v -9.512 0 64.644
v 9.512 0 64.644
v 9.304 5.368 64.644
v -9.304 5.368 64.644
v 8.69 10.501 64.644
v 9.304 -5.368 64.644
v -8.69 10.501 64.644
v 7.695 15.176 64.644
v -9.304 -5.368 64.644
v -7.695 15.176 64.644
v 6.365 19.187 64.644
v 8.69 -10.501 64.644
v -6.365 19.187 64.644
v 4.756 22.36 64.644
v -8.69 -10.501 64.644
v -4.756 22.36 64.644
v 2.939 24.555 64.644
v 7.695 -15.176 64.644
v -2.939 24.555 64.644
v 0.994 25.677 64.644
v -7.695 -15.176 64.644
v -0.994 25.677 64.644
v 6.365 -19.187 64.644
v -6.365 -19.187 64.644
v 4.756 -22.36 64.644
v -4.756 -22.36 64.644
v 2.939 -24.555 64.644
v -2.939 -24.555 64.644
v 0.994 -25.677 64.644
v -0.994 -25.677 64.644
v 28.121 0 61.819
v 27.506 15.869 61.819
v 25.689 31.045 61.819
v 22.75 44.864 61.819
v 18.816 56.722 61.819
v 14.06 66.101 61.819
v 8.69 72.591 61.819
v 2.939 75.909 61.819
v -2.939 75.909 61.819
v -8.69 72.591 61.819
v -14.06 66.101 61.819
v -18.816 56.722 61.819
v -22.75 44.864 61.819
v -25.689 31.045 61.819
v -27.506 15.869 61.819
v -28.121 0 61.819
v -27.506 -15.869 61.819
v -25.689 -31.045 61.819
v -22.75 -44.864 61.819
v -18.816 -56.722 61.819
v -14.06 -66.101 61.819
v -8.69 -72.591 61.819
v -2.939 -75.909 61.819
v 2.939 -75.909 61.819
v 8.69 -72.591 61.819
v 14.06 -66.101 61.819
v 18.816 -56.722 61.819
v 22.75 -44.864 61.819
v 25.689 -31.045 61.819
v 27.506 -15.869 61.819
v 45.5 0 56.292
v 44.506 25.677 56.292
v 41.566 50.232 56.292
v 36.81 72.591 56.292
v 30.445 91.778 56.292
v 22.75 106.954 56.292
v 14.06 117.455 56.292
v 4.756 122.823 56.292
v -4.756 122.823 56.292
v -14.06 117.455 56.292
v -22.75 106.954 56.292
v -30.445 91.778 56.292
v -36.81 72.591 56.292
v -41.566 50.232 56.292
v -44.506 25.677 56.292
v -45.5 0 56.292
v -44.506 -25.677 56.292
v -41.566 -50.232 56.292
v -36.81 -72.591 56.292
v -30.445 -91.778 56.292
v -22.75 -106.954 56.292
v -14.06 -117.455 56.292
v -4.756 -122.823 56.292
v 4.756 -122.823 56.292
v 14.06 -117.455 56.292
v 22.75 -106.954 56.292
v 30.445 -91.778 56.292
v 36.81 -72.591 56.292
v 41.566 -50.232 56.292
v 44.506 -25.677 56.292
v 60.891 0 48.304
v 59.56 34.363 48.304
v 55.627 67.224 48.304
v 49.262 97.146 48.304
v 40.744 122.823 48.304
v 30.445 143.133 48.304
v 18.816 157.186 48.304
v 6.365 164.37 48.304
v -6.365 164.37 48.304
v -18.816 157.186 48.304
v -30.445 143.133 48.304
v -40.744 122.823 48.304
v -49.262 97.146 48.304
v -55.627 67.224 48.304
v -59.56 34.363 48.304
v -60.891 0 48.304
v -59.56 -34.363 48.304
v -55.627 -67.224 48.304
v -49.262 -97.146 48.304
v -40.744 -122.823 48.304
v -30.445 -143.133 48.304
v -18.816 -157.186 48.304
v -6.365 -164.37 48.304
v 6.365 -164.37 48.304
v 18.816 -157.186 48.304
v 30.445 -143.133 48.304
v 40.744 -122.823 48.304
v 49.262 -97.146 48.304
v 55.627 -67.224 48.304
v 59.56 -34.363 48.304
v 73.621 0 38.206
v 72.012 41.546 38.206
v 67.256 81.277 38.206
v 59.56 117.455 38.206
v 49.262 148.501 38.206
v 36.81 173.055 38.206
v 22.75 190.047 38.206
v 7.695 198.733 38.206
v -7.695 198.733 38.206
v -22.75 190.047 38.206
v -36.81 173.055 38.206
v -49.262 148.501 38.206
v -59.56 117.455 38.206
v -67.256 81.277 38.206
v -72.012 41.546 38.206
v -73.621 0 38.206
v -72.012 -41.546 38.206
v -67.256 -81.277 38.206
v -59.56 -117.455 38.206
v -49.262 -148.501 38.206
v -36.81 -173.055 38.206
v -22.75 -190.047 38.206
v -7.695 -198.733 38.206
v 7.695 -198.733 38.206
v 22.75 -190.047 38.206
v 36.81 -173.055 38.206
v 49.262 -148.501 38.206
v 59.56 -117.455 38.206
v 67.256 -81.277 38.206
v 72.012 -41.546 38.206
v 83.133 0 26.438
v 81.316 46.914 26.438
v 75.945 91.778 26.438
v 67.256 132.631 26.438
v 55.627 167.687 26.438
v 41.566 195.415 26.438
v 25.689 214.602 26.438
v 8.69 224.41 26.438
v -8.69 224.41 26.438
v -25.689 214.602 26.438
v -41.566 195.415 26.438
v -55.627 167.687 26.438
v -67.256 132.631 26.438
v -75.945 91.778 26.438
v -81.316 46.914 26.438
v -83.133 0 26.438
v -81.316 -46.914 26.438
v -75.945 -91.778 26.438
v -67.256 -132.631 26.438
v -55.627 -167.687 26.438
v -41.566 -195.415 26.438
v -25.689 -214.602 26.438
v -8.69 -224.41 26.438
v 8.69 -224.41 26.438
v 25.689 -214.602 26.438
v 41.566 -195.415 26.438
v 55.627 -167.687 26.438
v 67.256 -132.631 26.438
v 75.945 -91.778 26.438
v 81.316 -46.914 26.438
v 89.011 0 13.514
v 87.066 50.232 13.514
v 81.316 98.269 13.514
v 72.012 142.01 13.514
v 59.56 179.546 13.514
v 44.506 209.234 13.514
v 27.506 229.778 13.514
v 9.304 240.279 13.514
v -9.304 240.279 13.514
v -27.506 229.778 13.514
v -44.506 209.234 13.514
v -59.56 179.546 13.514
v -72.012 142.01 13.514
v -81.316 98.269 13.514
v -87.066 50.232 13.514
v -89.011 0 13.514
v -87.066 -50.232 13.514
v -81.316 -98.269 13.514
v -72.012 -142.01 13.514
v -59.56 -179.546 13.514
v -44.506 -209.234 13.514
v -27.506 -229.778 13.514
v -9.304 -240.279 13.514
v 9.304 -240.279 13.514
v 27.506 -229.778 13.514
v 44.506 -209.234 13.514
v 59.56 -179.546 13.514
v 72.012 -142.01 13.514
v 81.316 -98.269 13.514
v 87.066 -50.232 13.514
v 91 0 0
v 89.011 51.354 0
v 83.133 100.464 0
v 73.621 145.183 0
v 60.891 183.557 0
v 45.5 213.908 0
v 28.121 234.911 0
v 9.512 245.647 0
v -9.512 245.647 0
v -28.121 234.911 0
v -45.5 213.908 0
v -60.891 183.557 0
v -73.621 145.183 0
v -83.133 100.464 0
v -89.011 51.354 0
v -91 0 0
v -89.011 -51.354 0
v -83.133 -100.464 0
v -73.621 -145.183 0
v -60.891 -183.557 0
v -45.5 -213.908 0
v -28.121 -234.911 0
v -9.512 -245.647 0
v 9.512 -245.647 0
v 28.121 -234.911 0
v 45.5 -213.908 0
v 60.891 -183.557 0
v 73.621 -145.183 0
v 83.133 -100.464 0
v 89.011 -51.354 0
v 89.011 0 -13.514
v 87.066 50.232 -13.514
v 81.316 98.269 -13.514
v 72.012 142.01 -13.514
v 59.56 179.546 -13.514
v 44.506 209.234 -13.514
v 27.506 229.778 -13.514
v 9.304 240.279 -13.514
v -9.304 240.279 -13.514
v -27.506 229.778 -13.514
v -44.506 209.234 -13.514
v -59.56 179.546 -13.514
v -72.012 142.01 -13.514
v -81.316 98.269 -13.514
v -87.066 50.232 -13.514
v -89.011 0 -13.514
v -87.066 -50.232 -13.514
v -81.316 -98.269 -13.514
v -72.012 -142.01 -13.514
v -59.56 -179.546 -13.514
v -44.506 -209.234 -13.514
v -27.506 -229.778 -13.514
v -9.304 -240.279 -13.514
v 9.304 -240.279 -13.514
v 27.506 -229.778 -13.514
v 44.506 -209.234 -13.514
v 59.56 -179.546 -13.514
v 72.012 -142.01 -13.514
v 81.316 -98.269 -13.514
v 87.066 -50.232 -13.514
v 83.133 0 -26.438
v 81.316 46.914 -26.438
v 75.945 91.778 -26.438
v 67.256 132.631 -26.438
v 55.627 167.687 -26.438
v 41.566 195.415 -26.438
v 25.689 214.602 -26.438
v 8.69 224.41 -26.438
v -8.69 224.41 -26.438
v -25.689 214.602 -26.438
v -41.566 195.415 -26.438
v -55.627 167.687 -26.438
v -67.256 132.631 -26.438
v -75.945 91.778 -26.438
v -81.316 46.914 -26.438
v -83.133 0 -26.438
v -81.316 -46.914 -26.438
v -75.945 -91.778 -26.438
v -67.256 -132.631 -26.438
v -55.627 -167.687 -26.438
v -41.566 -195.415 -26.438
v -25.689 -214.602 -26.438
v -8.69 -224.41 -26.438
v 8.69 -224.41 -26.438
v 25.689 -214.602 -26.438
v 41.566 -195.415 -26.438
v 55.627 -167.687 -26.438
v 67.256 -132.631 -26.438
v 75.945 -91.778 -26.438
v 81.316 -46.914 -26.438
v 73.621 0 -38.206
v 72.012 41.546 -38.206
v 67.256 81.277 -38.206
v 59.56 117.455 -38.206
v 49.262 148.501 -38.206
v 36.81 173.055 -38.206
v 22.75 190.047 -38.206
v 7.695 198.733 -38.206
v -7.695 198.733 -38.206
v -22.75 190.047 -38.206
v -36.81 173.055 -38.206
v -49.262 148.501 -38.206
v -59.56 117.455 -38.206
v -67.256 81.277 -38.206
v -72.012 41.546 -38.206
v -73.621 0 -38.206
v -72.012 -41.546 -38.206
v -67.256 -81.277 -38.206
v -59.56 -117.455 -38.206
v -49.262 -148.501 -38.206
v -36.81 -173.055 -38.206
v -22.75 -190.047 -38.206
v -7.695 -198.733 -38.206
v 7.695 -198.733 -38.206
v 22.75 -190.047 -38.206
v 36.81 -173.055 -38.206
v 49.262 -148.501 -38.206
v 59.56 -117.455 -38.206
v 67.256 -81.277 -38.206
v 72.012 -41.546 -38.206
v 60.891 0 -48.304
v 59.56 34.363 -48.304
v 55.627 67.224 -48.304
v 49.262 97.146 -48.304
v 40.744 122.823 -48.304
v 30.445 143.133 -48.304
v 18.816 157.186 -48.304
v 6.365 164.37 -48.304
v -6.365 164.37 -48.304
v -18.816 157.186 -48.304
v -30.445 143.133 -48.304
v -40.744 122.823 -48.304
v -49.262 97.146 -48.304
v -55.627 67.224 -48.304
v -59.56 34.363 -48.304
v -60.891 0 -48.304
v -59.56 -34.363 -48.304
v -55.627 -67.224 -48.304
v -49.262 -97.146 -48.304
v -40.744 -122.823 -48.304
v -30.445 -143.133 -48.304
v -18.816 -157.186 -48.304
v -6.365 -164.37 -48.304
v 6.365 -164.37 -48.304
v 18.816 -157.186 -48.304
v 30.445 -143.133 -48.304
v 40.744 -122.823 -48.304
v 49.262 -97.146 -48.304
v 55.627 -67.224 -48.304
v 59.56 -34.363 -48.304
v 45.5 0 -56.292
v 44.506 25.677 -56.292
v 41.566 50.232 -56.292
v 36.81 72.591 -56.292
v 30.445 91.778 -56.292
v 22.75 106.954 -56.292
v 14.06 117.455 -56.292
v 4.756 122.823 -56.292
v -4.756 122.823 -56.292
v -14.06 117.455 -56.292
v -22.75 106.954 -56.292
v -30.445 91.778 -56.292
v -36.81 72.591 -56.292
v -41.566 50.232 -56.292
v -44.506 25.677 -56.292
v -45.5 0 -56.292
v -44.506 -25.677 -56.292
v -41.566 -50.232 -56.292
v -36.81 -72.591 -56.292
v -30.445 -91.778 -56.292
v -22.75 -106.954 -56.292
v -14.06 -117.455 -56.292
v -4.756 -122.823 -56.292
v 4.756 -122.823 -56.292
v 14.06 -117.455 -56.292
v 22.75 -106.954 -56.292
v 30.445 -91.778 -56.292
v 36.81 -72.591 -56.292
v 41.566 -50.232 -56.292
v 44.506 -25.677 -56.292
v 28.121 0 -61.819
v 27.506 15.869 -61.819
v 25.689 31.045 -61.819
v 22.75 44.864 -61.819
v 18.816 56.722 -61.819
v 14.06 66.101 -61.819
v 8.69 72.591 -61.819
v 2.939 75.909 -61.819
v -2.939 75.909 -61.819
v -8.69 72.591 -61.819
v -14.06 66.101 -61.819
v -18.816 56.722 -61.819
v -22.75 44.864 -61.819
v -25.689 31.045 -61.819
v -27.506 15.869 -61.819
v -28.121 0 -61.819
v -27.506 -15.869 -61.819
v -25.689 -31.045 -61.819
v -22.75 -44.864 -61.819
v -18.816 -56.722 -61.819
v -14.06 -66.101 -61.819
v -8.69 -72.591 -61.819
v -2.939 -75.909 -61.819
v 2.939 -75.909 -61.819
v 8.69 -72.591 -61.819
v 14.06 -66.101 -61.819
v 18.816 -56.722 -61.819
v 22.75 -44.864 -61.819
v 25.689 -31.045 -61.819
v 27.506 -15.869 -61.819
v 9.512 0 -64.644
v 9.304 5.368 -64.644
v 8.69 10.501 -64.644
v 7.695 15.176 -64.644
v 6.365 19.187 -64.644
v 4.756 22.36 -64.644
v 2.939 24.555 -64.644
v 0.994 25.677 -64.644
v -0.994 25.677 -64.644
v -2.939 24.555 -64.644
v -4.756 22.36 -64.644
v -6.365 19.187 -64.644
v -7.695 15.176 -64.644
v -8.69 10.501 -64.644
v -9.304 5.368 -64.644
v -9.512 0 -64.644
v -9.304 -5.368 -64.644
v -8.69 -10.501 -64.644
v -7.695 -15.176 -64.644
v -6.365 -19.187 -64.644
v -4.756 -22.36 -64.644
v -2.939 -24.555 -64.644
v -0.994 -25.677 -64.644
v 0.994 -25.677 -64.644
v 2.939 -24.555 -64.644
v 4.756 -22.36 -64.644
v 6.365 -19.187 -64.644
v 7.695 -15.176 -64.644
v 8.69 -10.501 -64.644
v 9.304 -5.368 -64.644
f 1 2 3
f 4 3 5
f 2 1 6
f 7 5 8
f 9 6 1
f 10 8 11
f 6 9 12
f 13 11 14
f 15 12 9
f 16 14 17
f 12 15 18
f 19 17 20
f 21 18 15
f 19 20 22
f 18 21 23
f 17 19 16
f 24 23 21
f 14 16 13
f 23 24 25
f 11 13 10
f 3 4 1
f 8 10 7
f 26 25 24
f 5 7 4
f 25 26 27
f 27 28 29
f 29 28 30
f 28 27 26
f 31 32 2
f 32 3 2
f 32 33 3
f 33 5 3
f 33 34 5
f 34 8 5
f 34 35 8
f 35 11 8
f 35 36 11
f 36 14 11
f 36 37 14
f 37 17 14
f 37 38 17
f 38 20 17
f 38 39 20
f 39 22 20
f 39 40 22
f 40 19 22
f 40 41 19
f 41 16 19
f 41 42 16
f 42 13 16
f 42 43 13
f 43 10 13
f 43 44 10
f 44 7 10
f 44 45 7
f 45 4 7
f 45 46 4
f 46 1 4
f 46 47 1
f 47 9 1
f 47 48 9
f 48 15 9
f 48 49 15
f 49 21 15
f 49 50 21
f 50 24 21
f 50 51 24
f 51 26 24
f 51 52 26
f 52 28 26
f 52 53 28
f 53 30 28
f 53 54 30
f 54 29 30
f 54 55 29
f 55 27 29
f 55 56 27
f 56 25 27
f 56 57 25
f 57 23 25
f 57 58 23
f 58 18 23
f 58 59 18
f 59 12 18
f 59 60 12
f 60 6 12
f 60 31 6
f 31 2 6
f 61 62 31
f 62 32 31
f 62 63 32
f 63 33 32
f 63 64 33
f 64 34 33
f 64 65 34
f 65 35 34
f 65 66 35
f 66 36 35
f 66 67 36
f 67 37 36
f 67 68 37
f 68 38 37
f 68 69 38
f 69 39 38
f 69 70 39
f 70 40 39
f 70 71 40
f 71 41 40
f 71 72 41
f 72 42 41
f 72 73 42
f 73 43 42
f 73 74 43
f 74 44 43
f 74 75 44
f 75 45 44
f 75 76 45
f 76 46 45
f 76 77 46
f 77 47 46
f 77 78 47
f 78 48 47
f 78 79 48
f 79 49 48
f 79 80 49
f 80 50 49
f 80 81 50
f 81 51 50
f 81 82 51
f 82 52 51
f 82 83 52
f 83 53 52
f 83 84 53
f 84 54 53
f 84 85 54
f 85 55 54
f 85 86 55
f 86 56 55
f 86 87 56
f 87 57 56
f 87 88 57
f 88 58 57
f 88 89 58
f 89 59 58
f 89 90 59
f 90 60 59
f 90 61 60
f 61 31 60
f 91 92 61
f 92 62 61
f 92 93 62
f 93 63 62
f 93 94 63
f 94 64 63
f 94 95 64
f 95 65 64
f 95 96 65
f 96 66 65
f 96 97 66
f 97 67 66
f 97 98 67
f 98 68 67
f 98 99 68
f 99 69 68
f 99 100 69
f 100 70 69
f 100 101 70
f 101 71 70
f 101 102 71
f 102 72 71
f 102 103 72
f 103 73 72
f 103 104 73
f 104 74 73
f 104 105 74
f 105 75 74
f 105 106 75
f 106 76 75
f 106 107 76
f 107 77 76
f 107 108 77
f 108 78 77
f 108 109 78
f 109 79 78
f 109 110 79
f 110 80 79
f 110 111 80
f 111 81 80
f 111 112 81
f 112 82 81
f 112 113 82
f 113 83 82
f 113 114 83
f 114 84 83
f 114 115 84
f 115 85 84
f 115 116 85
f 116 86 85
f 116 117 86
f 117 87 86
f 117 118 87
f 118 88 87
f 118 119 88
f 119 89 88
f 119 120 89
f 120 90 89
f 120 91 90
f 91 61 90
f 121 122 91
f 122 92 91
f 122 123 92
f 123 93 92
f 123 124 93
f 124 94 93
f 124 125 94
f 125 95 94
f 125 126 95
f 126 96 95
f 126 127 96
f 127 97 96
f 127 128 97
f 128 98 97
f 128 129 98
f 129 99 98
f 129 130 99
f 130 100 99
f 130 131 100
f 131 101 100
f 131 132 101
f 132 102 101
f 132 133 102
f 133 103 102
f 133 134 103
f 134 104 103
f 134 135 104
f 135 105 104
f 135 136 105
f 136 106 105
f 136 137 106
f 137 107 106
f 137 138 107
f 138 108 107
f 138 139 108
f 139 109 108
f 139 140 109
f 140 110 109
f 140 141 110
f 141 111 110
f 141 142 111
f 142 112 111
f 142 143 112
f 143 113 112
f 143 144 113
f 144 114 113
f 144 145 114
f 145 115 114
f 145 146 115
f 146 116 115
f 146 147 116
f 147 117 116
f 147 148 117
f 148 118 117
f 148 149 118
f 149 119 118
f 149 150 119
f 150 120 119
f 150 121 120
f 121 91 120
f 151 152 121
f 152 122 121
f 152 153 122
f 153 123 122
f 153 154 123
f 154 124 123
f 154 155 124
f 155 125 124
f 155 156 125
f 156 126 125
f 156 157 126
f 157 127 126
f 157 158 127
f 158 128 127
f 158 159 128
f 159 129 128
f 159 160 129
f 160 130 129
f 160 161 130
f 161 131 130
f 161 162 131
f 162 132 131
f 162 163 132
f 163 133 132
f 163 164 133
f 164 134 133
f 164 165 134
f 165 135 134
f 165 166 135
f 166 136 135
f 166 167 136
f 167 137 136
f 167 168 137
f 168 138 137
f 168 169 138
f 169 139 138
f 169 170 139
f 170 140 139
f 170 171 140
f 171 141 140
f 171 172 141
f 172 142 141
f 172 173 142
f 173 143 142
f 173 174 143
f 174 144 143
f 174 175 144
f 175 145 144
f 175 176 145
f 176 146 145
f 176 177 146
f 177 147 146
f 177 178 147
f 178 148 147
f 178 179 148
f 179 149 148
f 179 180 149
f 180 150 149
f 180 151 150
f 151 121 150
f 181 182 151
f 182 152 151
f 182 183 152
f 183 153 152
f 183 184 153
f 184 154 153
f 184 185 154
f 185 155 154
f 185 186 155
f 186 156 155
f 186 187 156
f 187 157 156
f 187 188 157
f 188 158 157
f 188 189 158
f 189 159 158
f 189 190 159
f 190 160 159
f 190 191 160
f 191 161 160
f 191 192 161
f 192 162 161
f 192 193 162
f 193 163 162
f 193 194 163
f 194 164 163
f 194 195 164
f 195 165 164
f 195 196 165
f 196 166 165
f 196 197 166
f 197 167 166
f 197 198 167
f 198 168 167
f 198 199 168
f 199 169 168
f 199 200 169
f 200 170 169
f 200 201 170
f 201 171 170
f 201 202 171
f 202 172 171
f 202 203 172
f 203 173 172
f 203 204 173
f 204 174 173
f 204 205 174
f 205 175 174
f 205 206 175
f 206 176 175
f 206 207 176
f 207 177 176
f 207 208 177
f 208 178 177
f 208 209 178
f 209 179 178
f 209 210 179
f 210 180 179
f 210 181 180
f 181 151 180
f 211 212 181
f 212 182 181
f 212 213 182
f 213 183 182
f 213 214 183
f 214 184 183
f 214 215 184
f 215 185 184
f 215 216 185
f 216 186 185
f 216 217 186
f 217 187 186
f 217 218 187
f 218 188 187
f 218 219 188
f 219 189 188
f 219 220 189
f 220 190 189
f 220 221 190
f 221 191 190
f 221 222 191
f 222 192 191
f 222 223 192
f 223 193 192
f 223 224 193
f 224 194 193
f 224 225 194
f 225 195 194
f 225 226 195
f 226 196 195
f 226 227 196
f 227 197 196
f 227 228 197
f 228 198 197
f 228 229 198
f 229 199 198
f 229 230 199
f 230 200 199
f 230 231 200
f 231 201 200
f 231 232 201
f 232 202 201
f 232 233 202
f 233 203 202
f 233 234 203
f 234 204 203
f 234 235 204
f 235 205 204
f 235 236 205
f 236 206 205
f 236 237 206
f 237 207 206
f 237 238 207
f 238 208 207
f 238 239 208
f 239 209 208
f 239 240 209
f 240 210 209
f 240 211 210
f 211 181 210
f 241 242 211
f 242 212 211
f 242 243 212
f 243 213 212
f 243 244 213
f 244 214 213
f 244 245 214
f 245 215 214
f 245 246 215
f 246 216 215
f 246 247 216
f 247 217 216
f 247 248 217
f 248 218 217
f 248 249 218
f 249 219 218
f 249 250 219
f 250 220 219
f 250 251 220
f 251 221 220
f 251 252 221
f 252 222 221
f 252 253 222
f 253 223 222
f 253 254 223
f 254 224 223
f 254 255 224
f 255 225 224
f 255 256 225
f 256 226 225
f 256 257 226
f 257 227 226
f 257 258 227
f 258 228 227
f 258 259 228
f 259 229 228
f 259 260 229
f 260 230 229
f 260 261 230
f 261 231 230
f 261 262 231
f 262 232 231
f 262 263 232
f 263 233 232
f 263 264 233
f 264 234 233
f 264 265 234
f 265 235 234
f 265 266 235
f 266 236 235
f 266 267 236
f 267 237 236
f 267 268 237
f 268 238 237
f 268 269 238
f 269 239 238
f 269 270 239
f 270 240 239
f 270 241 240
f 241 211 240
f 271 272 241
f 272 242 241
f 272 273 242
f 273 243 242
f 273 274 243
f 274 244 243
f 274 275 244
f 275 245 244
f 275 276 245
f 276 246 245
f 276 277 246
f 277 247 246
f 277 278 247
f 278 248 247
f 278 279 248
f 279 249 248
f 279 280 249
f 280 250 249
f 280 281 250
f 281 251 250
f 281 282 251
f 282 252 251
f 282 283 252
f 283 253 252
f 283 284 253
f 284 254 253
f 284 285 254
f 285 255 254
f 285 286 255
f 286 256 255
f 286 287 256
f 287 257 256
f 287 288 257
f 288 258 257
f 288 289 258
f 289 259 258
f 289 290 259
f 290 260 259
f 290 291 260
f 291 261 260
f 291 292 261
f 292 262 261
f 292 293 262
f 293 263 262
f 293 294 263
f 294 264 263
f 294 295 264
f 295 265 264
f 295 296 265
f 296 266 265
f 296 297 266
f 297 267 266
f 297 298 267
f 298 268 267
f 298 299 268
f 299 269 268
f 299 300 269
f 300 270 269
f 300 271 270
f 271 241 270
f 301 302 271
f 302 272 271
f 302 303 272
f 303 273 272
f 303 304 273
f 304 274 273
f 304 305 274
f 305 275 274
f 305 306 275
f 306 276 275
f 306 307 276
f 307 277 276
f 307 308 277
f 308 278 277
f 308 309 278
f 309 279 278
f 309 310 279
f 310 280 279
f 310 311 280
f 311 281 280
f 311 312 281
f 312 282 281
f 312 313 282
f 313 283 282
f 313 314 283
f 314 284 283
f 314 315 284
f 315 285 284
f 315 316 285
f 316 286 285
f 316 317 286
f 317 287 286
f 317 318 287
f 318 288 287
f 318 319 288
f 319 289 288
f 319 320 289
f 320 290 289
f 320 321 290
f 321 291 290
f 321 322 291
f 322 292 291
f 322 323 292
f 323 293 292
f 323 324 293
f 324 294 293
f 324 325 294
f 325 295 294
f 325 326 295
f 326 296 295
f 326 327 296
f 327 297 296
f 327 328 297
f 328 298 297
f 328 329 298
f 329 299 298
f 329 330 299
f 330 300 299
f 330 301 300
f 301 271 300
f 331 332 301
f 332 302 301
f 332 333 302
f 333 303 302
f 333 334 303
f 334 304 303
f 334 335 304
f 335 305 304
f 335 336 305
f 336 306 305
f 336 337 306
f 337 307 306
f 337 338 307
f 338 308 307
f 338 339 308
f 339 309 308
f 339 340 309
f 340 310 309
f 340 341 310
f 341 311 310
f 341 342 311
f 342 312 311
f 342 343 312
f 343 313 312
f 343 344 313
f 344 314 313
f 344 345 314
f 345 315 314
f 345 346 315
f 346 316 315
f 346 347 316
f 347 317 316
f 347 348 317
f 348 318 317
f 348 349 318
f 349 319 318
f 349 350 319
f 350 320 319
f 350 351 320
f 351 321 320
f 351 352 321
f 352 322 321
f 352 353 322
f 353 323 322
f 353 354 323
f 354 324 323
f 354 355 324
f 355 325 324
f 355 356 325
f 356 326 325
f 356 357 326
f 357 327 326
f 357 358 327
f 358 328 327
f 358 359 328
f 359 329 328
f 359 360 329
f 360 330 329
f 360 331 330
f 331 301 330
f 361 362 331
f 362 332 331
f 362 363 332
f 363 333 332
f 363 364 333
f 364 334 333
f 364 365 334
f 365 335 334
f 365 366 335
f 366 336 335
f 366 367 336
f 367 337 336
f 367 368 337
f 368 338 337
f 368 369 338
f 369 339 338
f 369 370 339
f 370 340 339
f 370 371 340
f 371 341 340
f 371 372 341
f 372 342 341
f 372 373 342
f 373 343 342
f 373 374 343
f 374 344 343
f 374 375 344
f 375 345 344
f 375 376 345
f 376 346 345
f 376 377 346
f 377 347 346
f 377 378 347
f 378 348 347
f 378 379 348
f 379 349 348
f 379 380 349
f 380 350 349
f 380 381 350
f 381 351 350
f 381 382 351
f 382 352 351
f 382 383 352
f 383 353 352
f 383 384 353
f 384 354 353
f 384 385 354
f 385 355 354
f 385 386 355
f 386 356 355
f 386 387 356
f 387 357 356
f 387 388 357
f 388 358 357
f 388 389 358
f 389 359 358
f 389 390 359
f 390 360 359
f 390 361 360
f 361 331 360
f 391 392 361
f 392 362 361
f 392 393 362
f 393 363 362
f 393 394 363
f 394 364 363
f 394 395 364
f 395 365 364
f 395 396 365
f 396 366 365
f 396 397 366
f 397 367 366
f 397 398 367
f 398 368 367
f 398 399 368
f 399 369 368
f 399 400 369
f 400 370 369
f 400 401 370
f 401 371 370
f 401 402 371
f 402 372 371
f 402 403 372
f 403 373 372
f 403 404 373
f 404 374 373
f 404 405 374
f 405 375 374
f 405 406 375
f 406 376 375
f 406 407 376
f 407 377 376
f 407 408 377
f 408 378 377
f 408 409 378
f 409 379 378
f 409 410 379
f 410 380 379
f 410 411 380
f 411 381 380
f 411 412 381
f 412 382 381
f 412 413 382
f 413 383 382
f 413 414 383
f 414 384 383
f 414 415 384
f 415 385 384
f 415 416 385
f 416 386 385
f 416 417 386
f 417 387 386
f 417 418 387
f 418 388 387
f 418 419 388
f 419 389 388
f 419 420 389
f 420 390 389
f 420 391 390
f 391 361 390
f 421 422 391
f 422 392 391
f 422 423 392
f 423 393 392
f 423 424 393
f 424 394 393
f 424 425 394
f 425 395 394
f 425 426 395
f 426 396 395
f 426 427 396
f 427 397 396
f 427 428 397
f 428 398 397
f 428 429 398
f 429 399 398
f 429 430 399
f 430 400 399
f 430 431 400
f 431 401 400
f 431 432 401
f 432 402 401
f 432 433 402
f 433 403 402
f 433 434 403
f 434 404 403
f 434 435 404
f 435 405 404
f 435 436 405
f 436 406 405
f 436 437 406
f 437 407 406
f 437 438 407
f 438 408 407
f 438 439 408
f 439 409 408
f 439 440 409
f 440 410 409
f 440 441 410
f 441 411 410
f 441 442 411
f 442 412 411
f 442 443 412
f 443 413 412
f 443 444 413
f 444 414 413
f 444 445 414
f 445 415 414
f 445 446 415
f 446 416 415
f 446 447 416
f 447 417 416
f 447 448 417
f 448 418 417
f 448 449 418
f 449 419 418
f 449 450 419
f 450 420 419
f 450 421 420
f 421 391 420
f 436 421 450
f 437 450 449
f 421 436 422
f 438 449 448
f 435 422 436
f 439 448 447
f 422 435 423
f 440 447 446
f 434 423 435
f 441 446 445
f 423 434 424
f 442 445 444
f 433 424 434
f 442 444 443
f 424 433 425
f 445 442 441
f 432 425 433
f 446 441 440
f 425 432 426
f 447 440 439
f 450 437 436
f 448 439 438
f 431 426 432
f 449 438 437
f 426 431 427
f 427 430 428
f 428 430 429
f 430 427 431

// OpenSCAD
// Generated by SolidPython 1.0.1 on 2020-07-29 00:46:48


scale(v = [7, 19, 5]) {
	sphere(r = 13);
}
/***********************************************
*********      SolidPython code:      **********
************************************************
 
# import packages: SolidPython
from solid import *
from solid.utils import *
from itertools import chain, combinations, permutations


class Resize:

    def __init__(self, scad_file):
        self.scad_file = scad_file
        #self.scad_file = import_scad(scad_file)
        # cone/cylinder param:
        self.r1 = 0
        self.r2 = 0
        self.h = 0
        # rectangular prism param:
        self.w = 0
        self.l = 0
        # ellipse param:
        self.r = 0

    # import OpenScad code (file name corresponds to shape)


    # classify shape + parameters
    def assign(self, param1, param2, param3):
        if self.scad_file == 'cone.scad':
            self.r1 = param1
            self.r2 = param2
            self.h = param3
        elif self.scad_file == 'cylinder.scad':
            self.r1 = param1
            self.r2 = param2
            self.h = param3
        elif self.scad_file == 'rectangularPrism.scad':
            self.h = param1
            self.l = param2
            self.w = param3
        else:
            self.r = param1
            self.h = param2

    # resize parameters
    def iterate(self):
        x = range(3, 20, 2)
        i = 1
        if self.scad_file == 'cone.scad':
            tempList = list(permutations(x, 2))
            for temp in tempList:
                param1 = temp[0]
                param2 = temp[1]
                filepath = 'produced_scad_files/' + 'cone' + str(param1) + '_' + str(param2) + '_' + '.scad'
                scad_render_to_file(cylinder(h=param1, r1=param2, r2=0), filepath)

        elif self.scad_file == 'cylinder.scad':
            tempList = list(permutations(x, 3))
            for temp in tempList:
                param1 = temp[0]
                param2 = temp[1]
                filepath = 'produced_scad_files/' + 'cylinder' + str(param1) + '_' + str(param2) + '_' + '.scad'
                scad_render_to_file(cylinder(h=param1, r1=param2, r2=param2), filepath)

        elif self.scad_file == 'rectangularPrism.scad':
            tempList = list(permutations(x, 3))
            for temp in tempList:
                param1 = temp[0]
                param2 = temp[1]
                param3 = temp[2]
                filepath = 'produced_scad_files/' + 'rectangularPrism' + str(param1) + '_' + str(param2) + '_' + str(
                    param3) + '.scad'
                scad_render_to_file(cube(size=(param1, param2, param3)), filepath)

        elif self.scad_file == 'ellipse.scad':
            tempList = list(permutations(x, 4))
            for temp in tempList:
                param1 = temp[0]
                param2 = temp[1]
                param3 = temp[2]
                param4 = temp[3]
                filepath = 'produced_scad_files/' + 'ellipse' + str(param1) + '_' + str(param2) + '_' + str(param3) + '_' + str(param4) + '.scad'
                scad_render_to_file(scale([param1, param2, param3])(sphere(r=param4)), filepath)

    def render_to_scadfile(self):
        scad_render_to_file(scad, 'example.scad') 
 
************************************************/
